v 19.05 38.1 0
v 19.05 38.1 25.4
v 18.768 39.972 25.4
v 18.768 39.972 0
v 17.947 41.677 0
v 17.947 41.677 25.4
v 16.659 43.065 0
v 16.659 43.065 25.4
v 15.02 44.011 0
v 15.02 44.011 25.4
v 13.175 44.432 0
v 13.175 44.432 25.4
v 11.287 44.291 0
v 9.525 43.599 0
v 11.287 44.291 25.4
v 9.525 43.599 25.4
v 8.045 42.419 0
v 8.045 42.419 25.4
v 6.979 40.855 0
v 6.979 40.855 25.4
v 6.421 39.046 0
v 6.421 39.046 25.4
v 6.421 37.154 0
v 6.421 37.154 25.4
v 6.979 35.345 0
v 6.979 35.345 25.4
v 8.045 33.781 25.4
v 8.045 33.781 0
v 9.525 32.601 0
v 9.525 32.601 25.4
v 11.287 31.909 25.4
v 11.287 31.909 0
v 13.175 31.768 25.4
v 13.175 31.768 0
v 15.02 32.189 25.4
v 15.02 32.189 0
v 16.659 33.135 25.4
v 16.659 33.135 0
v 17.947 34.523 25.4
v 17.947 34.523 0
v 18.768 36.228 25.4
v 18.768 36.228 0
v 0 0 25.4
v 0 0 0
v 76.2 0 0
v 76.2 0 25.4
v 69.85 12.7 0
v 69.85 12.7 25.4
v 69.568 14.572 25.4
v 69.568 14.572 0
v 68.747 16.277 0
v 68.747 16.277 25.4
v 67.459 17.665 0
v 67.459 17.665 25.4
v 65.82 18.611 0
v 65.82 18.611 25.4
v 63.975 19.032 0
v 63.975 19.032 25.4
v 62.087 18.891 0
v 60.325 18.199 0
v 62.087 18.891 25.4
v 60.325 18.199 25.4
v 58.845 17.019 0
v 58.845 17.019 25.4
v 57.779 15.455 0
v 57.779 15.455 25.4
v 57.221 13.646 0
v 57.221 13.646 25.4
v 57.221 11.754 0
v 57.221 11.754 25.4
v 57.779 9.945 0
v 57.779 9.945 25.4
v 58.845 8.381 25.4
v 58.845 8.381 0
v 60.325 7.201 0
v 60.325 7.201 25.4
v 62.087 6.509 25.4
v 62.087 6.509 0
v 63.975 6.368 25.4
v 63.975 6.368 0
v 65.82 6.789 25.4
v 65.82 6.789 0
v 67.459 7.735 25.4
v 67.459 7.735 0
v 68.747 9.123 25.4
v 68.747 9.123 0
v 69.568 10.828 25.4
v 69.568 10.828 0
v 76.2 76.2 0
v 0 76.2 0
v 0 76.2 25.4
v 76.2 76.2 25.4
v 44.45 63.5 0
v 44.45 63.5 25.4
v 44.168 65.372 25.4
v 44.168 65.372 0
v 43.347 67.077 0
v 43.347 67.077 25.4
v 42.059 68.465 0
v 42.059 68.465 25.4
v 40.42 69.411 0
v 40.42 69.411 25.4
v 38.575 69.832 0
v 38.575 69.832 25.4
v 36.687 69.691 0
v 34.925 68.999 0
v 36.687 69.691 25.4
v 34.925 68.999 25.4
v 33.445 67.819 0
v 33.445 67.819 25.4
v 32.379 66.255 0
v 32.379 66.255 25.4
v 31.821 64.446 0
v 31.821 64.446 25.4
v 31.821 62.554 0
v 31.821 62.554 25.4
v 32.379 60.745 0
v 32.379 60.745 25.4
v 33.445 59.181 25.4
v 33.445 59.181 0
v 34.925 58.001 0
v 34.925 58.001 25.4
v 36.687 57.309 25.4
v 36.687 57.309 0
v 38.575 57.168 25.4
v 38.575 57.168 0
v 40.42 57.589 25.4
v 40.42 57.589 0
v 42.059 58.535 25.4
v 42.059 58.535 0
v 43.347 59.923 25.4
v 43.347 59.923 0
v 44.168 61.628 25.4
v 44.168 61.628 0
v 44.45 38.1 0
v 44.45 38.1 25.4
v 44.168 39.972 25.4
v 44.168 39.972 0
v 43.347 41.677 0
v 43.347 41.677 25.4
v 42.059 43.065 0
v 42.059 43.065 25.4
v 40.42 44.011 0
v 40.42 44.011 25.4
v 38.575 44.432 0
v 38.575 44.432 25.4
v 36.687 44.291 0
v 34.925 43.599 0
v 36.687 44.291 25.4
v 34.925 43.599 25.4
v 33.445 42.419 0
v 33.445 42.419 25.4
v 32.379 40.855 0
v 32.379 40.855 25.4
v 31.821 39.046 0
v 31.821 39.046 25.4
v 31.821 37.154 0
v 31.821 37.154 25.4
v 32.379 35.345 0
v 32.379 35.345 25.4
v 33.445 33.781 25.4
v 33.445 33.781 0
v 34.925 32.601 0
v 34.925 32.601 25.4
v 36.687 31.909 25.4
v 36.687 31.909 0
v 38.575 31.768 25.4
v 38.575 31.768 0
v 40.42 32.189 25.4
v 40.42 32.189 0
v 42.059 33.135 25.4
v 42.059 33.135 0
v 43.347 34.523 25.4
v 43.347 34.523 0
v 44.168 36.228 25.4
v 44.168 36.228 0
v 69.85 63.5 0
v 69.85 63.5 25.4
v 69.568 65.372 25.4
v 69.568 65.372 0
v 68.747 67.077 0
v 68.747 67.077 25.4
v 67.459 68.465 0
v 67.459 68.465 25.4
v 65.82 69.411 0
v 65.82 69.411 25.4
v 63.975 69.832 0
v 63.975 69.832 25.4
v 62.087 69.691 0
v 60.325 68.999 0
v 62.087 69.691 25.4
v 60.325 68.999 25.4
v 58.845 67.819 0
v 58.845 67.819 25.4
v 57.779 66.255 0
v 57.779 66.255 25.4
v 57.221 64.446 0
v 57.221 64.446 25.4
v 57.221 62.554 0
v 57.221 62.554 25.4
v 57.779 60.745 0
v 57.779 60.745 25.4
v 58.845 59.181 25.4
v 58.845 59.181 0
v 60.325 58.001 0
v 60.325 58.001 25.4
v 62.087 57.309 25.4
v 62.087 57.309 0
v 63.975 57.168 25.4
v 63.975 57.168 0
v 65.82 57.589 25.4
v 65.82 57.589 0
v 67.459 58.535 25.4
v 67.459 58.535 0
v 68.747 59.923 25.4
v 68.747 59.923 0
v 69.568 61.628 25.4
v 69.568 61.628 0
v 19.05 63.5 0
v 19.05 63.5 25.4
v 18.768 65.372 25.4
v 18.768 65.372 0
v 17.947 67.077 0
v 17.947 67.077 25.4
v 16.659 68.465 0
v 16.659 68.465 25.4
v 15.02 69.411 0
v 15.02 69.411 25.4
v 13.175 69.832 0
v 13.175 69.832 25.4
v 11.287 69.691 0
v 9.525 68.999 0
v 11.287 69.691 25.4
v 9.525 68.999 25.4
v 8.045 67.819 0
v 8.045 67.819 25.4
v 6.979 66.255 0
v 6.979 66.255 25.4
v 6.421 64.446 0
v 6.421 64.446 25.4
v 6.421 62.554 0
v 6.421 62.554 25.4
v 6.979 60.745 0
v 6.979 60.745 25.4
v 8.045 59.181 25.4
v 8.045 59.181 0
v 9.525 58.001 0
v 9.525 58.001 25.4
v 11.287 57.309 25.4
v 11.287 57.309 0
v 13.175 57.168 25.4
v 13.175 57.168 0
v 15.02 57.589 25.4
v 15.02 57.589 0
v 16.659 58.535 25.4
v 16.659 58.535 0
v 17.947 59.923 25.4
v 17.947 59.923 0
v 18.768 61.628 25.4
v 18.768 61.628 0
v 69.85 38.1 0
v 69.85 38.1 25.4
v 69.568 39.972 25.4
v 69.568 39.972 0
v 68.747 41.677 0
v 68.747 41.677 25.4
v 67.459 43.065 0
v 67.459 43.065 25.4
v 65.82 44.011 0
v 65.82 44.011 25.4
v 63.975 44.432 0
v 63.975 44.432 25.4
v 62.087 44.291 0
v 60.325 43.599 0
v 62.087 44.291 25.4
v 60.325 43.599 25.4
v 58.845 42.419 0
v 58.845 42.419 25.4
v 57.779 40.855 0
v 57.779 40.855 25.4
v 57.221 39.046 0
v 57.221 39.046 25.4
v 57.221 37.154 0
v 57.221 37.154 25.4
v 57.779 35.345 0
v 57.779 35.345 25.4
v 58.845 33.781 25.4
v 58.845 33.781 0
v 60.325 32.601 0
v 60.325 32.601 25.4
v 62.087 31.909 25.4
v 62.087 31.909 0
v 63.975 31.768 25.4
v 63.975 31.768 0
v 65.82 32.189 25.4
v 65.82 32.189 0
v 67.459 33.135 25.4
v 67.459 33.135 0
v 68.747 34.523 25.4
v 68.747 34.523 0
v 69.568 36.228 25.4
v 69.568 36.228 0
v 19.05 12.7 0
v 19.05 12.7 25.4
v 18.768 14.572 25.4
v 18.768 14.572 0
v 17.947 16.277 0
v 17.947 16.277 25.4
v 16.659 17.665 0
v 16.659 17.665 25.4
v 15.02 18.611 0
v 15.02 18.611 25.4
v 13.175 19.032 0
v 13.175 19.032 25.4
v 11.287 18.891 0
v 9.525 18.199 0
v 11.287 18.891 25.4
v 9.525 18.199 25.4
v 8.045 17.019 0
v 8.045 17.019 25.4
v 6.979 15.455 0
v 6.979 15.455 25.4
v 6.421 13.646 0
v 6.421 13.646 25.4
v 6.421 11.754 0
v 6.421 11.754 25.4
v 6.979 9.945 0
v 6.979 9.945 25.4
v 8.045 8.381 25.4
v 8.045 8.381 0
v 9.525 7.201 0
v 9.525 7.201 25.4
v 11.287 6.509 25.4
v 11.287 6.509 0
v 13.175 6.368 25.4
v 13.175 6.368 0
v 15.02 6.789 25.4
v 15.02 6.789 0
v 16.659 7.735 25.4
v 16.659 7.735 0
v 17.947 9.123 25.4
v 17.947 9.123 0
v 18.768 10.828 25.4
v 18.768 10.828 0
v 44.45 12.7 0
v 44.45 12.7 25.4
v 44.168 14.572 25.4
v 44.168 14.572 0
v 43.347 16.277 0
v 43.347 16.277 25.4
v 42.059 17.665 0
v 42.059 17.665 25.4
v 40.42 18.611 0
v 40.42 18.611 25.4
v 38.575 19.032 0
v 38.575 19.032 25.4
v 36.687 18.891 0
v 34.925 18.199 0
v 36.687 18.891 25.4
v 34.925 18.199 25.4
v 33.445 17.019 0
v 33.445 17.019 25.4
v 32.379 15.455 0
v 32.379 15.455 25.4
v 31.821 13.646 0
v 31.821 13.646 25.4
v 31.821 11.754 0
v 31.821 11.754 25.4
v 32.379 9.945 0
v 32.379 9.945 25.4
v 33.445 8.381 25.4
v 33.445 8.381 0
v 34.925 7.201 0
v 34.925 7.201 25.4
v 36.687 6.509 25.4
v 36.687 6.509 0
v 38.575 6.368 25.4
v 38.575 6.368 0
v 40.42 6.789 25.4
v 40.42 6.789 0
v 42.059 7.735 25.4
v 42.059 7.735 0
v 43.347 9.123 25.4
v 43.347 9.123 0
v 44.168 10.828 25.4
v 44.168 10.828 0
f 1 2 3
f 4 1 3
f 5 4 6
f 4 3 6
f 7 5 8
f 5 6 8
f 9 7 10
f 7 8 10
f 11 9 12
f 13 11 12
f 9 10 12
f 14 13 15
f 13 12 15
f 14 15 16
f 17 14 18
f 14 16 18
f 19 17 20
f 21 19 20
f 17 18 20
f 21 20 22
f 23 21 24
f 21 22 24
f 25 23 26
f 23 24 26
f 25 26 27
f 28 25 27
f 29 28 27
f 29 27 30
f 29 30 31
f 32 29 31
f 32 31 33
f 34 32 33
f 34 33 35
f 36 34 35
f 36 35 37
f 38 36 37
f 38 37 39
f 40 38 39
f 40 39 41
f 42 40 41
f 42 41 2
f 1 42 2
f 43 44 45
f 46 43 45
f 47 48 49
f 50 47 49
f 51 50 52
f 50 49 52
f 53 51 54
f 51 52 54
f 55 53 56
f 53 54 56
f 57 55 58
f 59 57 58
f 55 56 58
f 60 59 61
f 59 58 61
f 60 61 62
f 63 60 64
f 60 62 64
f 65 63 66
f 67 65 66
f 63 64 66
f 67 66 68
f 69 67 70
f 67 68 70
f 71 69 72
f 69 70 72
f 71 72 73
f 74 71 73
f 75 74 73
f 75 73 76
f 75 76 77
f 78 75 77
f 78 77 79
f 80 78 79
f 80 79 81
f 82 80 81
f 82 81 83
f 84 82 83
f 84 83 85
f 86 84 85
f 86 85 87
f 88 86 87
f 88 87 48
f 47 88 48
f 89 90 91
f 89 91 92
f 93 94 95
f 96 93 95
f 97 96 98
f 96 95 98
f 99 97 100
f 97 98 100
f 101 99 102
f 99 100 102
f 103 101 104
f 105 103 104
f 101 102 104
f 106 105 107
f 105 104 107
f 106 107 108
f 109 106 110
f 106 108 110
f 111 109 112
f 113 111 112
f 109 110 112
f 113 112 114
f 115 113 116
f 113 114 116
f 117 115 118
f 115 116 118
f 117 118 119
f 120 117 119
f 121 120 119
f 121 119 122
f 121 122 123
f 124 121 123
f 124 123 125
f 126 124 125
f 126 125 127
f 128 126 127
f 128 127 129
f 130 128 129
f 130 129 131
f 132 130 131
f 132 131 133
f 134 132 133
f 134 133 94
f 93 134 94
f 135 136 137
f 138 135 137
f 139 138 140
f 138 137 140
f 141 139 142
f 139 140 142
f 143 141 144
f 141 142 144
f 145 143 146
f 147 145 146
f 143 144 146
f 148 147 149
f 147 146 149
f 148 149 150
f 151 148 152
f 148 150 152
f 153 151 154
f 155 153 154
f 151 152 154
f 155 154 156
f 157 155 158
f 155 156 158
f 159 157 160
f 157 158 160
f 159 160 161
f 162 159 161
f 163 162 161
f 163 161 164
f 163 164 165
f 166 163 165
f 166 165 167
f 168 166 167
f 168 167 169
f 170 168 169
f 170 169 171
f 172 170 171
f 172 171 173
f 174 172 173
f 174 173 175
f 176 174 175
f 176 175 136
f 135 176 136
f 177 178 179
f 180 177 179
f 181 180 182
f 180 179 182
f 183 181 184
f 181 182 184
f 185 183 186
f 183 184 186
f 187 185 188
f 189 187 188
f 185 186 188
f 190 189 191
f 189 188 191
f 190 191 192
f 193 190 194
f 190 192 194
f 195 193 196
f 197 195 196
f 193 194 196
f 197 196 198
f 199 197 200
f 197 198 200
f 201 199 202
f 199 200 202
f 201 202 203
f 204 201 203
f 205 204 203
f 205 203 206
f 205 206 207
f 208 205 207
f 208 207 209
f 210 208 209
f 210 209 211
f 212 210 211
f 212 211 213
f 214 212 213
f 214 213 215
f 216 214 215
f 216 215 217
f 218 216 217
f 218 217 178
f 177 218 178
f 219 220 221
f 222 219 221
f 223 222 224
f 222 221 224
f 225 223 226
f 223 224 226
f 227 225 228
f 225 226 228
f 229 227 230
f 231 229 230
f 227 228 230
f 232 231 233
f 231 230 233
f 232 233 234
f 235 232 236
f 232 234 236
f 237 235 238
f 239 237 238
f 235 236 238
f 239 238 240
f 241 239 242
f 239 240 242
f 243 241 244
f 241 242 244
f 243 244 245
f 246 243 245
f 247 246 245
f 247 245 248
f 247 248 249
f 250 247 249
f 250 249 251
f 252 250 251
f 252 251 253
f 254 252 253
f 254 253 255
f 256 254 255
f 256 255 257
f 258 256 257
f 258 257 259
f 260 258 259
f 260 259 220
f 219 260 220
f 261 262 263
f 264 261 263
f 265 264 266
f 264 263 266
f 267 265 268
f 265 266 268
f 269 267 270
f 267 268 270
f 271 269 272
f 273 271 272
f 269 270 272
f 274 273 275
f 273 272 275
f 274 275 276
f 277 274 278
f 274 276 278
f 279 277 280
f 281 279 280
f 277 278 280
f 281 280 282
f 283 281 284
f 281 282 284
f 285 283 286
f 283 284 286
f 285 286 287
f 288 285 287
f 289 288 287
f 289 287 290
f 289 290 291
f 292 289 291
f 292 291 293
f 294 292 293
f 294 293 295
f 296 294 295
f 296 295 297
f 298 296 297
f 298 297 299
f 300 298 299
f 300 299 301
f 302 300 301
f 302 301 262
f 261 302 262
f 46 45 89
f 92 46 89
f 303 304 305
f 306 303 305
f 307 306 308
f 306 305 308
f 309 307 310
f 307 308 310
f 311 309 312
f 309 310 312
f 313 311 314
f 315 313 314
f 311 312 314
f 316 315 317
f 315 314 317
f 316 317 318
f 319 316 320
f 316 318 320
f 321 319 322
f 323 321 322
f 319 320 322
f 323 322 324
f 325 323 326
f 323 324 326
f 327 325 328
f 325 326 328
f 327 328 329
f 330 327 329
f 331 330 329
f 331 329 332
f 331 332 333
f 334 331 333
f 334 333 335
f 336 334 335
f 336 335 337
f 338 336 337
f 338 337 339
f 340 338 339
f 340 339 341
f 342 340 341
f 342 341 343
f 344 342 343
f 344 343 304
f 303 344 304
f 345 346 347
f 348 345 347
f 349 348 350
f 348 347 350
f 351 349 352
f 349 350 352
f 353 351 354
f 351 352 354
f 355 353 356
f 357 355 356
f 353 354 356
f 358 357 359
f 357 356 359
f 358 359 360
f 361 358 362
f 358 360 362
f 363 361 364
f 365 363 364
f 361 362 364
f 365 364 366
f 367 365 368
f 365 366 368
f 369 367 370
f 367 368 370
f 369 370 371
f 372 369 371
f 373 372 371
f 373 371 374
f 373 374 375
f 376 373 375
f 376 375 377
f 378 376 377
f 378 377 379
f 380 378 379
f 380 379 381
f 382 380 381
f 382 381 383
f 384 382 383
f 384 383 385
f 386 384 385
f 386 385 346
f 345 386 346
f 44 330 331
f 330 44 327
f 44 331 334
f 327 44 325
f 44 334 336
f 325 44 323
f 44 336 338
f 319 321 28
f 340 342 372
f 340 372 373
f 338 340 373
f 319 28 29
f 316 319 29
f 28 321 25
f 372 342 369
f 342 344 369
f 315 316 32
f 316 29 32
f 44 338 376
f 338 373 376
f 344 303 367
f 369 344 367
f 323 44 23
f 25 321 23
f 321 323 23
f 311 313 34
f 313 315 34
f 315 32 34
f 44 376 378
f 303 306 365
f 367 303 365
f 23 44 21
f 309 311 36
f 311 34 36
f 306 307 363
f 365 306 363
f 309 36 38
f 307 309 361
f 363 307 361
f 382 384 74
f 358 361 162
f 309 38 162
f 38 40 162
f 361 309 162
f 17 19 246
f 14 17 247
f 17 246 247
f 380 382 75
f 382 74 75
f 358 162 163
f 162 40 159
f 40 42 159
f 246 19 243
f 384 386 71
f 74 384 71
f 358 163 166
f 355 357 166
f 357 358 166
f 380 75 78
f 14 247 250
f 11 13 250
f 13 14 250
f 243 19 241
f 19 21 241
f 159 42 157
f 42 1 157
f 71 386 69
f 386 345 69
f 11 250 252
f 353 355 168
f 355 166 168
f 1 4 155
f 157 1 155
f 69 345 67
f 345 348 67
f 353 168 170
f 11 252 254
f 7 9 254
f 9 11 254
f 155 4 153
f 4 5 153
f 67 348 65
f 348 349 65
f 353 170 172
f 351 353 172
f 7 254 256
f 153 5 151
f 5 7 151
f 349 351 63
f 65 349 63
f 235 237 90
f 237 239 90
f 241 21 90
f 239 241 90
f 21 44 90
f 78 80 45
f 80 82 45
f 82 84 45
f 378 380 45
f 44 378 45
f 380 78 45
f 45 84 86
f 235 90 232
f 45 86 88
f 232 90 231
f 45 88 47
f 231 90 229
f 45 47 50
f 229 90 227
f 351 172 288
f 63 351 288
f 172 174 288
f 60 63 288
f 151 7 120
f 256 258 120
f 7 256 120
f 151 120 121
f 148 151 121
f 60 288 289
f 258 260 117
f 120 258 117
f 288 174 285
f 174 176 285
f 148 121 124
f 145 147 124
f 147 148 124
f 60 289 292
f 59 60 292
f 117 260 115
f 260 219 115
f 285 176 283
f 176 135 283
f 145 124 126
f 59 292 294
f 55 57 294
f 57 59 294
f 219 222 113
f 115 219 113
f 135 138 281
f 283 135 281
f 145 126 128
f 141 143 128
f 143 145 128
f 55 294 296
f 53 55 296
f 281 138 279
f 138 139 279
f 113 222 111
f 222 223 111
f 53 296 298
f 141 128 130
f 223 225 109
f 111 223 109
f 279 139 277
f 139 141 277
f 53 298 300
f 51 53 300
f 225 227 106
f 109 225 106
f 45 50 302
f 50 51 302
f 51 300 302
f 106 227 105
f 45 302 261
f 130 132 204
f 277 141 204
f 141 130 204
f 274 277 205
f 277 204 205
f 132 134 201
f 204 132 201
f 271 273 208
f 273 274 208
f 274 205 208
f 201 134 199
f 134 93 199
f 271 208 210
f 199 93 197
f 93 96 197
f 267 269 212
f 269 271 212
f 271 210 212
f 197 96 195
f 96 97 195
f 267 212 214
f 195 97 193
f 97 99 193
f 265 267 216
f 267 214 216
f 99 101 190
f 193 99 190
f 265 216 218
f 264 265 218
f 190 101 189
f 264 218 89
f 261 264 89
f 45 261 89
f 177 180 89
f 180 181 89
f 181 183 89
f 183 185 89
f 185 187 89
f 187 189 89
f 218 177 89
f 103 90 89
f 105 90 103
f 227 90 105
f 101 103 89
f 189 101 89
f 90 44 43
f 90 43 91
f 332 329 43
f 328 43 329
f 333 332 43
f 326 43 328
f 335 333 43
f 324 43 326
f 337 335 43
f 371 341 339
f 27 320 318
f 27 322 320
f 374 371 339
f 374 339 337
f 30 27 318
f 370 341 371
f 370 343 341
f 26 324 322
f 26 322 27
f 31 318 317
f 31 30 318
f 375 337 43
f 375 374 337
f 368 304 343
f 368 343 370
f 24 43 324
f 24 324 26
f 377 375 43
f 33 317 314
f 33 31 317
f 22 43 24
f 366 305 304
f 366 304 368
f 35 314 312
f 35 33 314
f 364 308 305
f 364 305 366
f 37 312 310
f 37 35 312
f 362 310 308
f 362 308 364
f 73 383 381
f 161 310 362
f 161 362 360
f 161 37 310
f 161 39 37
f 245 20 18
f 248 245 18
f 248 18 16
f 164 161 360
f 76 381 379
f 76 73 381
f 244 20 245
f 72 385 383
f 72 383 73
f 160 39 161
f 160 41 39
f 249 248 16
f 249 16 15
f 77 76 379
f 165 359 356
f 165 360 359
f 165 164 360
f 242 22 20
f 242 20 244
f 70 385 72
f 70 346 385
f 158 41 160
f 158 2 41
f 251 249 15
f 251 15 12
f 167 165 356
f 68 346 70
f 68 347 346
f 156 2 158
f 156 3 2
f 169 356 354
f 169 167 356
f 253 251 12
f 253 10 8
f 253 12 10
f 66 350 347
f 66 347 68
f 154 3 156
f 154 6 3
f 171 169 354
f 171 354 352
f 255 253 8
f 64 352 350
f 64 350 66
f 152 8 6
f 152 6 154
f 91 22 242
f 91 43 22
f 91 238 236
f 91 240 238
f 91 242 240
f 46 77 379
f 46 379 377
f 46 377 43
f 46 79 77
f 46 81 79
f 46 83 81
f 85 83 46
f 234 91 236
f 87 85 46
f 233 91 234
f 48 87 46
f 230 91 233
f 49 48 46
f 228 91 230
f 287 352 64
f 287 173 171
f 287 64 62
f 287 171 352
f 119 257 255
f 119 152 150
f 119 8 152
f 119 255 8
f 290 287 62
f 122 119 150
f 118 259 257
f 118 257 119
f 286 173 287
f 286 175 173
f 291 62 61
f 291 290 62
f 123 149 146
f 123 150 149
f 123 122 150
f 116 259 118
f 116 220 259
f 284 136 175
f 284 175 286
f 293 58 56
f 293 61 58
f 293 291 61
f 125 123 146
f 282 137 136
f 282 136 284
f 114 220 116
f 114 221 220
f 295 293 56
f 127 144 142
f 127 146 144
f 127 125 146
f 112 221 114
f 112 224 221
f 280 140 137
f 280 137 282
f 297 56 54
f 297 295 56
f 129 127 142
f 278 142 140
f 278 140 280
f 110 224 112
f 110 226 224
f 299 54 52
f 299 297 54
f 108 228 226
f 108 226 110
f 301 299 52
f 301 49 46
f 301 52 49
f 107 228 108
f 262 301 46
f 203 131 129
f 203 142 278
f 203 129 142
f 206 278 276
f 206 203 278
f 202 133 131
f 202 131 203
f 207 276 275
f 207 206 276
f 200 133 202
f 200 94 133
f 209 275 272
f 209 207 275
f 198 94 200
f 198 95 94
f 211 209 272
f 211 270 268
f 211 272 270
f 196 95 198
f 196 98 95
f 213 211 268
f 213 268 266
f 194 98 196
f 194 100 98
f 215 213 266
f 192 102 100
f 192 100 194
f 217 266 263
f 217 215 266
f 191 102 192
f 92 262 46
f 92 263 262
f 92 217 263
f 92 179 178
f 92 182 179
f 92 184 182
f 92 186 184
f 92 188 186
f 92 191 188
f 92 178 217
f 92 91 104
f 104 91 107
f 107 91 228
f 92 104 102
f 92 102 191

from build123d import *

# Parameters (mm, degrees)
SKETCH2_W            = 76.2
SKETCH2_H            = 76.2
BOSS_EXTRUDE1_DEPTH  = 25.4
SKETCH3_R            = 6.35
CUT_EXTRUDE1_DEPTH   = 111.716033166
LPATTERN1_COUNT      = 3
LPATTERN1_PITCH      = 25.4
LPATTERN1_COUNT_DIR2 = 3
LPATTERN1_PITCH_DIR2 = 25.4


with BuildPart() as part:
    # Sketch2 → Boss-Extrude1 (new body)
    with BuildSketch(Plane.XY):
        with Locations((38.1, 38.1)):
            Rectangle(SKETCH2_W, SKETCH2_H)
    extrude(amount=BOSS_EXTRUDE1_DEPTH)

    # Sketch3 → Cut-Extrude1 (cut, through all)
    with BuildSketch(Plane.XY.offset(25.4)):
        with Locations((12.7, 12.7)):
            Circle(SKETCH3_R)
    cut_extrude1 = extrude(amount=-CUT_EXTRUDE1_DEPTH, mode=Mode.SUBTRACT)

    # LPattern1: Cut-Extrude1 3 × 3
    with Locations(*[(j * LPATTERN1_PITCH_DIR2, i * LPATTERN1_PITCH, 0) for i in range(LPATTERN1_COUNT) for j in range(LPATTERN1_COUNT_DIR2) if (i, j) != (0, 0)]):
        add(cut_extrude1, mode=Mode.SUBTRACT)


solid = part.part
